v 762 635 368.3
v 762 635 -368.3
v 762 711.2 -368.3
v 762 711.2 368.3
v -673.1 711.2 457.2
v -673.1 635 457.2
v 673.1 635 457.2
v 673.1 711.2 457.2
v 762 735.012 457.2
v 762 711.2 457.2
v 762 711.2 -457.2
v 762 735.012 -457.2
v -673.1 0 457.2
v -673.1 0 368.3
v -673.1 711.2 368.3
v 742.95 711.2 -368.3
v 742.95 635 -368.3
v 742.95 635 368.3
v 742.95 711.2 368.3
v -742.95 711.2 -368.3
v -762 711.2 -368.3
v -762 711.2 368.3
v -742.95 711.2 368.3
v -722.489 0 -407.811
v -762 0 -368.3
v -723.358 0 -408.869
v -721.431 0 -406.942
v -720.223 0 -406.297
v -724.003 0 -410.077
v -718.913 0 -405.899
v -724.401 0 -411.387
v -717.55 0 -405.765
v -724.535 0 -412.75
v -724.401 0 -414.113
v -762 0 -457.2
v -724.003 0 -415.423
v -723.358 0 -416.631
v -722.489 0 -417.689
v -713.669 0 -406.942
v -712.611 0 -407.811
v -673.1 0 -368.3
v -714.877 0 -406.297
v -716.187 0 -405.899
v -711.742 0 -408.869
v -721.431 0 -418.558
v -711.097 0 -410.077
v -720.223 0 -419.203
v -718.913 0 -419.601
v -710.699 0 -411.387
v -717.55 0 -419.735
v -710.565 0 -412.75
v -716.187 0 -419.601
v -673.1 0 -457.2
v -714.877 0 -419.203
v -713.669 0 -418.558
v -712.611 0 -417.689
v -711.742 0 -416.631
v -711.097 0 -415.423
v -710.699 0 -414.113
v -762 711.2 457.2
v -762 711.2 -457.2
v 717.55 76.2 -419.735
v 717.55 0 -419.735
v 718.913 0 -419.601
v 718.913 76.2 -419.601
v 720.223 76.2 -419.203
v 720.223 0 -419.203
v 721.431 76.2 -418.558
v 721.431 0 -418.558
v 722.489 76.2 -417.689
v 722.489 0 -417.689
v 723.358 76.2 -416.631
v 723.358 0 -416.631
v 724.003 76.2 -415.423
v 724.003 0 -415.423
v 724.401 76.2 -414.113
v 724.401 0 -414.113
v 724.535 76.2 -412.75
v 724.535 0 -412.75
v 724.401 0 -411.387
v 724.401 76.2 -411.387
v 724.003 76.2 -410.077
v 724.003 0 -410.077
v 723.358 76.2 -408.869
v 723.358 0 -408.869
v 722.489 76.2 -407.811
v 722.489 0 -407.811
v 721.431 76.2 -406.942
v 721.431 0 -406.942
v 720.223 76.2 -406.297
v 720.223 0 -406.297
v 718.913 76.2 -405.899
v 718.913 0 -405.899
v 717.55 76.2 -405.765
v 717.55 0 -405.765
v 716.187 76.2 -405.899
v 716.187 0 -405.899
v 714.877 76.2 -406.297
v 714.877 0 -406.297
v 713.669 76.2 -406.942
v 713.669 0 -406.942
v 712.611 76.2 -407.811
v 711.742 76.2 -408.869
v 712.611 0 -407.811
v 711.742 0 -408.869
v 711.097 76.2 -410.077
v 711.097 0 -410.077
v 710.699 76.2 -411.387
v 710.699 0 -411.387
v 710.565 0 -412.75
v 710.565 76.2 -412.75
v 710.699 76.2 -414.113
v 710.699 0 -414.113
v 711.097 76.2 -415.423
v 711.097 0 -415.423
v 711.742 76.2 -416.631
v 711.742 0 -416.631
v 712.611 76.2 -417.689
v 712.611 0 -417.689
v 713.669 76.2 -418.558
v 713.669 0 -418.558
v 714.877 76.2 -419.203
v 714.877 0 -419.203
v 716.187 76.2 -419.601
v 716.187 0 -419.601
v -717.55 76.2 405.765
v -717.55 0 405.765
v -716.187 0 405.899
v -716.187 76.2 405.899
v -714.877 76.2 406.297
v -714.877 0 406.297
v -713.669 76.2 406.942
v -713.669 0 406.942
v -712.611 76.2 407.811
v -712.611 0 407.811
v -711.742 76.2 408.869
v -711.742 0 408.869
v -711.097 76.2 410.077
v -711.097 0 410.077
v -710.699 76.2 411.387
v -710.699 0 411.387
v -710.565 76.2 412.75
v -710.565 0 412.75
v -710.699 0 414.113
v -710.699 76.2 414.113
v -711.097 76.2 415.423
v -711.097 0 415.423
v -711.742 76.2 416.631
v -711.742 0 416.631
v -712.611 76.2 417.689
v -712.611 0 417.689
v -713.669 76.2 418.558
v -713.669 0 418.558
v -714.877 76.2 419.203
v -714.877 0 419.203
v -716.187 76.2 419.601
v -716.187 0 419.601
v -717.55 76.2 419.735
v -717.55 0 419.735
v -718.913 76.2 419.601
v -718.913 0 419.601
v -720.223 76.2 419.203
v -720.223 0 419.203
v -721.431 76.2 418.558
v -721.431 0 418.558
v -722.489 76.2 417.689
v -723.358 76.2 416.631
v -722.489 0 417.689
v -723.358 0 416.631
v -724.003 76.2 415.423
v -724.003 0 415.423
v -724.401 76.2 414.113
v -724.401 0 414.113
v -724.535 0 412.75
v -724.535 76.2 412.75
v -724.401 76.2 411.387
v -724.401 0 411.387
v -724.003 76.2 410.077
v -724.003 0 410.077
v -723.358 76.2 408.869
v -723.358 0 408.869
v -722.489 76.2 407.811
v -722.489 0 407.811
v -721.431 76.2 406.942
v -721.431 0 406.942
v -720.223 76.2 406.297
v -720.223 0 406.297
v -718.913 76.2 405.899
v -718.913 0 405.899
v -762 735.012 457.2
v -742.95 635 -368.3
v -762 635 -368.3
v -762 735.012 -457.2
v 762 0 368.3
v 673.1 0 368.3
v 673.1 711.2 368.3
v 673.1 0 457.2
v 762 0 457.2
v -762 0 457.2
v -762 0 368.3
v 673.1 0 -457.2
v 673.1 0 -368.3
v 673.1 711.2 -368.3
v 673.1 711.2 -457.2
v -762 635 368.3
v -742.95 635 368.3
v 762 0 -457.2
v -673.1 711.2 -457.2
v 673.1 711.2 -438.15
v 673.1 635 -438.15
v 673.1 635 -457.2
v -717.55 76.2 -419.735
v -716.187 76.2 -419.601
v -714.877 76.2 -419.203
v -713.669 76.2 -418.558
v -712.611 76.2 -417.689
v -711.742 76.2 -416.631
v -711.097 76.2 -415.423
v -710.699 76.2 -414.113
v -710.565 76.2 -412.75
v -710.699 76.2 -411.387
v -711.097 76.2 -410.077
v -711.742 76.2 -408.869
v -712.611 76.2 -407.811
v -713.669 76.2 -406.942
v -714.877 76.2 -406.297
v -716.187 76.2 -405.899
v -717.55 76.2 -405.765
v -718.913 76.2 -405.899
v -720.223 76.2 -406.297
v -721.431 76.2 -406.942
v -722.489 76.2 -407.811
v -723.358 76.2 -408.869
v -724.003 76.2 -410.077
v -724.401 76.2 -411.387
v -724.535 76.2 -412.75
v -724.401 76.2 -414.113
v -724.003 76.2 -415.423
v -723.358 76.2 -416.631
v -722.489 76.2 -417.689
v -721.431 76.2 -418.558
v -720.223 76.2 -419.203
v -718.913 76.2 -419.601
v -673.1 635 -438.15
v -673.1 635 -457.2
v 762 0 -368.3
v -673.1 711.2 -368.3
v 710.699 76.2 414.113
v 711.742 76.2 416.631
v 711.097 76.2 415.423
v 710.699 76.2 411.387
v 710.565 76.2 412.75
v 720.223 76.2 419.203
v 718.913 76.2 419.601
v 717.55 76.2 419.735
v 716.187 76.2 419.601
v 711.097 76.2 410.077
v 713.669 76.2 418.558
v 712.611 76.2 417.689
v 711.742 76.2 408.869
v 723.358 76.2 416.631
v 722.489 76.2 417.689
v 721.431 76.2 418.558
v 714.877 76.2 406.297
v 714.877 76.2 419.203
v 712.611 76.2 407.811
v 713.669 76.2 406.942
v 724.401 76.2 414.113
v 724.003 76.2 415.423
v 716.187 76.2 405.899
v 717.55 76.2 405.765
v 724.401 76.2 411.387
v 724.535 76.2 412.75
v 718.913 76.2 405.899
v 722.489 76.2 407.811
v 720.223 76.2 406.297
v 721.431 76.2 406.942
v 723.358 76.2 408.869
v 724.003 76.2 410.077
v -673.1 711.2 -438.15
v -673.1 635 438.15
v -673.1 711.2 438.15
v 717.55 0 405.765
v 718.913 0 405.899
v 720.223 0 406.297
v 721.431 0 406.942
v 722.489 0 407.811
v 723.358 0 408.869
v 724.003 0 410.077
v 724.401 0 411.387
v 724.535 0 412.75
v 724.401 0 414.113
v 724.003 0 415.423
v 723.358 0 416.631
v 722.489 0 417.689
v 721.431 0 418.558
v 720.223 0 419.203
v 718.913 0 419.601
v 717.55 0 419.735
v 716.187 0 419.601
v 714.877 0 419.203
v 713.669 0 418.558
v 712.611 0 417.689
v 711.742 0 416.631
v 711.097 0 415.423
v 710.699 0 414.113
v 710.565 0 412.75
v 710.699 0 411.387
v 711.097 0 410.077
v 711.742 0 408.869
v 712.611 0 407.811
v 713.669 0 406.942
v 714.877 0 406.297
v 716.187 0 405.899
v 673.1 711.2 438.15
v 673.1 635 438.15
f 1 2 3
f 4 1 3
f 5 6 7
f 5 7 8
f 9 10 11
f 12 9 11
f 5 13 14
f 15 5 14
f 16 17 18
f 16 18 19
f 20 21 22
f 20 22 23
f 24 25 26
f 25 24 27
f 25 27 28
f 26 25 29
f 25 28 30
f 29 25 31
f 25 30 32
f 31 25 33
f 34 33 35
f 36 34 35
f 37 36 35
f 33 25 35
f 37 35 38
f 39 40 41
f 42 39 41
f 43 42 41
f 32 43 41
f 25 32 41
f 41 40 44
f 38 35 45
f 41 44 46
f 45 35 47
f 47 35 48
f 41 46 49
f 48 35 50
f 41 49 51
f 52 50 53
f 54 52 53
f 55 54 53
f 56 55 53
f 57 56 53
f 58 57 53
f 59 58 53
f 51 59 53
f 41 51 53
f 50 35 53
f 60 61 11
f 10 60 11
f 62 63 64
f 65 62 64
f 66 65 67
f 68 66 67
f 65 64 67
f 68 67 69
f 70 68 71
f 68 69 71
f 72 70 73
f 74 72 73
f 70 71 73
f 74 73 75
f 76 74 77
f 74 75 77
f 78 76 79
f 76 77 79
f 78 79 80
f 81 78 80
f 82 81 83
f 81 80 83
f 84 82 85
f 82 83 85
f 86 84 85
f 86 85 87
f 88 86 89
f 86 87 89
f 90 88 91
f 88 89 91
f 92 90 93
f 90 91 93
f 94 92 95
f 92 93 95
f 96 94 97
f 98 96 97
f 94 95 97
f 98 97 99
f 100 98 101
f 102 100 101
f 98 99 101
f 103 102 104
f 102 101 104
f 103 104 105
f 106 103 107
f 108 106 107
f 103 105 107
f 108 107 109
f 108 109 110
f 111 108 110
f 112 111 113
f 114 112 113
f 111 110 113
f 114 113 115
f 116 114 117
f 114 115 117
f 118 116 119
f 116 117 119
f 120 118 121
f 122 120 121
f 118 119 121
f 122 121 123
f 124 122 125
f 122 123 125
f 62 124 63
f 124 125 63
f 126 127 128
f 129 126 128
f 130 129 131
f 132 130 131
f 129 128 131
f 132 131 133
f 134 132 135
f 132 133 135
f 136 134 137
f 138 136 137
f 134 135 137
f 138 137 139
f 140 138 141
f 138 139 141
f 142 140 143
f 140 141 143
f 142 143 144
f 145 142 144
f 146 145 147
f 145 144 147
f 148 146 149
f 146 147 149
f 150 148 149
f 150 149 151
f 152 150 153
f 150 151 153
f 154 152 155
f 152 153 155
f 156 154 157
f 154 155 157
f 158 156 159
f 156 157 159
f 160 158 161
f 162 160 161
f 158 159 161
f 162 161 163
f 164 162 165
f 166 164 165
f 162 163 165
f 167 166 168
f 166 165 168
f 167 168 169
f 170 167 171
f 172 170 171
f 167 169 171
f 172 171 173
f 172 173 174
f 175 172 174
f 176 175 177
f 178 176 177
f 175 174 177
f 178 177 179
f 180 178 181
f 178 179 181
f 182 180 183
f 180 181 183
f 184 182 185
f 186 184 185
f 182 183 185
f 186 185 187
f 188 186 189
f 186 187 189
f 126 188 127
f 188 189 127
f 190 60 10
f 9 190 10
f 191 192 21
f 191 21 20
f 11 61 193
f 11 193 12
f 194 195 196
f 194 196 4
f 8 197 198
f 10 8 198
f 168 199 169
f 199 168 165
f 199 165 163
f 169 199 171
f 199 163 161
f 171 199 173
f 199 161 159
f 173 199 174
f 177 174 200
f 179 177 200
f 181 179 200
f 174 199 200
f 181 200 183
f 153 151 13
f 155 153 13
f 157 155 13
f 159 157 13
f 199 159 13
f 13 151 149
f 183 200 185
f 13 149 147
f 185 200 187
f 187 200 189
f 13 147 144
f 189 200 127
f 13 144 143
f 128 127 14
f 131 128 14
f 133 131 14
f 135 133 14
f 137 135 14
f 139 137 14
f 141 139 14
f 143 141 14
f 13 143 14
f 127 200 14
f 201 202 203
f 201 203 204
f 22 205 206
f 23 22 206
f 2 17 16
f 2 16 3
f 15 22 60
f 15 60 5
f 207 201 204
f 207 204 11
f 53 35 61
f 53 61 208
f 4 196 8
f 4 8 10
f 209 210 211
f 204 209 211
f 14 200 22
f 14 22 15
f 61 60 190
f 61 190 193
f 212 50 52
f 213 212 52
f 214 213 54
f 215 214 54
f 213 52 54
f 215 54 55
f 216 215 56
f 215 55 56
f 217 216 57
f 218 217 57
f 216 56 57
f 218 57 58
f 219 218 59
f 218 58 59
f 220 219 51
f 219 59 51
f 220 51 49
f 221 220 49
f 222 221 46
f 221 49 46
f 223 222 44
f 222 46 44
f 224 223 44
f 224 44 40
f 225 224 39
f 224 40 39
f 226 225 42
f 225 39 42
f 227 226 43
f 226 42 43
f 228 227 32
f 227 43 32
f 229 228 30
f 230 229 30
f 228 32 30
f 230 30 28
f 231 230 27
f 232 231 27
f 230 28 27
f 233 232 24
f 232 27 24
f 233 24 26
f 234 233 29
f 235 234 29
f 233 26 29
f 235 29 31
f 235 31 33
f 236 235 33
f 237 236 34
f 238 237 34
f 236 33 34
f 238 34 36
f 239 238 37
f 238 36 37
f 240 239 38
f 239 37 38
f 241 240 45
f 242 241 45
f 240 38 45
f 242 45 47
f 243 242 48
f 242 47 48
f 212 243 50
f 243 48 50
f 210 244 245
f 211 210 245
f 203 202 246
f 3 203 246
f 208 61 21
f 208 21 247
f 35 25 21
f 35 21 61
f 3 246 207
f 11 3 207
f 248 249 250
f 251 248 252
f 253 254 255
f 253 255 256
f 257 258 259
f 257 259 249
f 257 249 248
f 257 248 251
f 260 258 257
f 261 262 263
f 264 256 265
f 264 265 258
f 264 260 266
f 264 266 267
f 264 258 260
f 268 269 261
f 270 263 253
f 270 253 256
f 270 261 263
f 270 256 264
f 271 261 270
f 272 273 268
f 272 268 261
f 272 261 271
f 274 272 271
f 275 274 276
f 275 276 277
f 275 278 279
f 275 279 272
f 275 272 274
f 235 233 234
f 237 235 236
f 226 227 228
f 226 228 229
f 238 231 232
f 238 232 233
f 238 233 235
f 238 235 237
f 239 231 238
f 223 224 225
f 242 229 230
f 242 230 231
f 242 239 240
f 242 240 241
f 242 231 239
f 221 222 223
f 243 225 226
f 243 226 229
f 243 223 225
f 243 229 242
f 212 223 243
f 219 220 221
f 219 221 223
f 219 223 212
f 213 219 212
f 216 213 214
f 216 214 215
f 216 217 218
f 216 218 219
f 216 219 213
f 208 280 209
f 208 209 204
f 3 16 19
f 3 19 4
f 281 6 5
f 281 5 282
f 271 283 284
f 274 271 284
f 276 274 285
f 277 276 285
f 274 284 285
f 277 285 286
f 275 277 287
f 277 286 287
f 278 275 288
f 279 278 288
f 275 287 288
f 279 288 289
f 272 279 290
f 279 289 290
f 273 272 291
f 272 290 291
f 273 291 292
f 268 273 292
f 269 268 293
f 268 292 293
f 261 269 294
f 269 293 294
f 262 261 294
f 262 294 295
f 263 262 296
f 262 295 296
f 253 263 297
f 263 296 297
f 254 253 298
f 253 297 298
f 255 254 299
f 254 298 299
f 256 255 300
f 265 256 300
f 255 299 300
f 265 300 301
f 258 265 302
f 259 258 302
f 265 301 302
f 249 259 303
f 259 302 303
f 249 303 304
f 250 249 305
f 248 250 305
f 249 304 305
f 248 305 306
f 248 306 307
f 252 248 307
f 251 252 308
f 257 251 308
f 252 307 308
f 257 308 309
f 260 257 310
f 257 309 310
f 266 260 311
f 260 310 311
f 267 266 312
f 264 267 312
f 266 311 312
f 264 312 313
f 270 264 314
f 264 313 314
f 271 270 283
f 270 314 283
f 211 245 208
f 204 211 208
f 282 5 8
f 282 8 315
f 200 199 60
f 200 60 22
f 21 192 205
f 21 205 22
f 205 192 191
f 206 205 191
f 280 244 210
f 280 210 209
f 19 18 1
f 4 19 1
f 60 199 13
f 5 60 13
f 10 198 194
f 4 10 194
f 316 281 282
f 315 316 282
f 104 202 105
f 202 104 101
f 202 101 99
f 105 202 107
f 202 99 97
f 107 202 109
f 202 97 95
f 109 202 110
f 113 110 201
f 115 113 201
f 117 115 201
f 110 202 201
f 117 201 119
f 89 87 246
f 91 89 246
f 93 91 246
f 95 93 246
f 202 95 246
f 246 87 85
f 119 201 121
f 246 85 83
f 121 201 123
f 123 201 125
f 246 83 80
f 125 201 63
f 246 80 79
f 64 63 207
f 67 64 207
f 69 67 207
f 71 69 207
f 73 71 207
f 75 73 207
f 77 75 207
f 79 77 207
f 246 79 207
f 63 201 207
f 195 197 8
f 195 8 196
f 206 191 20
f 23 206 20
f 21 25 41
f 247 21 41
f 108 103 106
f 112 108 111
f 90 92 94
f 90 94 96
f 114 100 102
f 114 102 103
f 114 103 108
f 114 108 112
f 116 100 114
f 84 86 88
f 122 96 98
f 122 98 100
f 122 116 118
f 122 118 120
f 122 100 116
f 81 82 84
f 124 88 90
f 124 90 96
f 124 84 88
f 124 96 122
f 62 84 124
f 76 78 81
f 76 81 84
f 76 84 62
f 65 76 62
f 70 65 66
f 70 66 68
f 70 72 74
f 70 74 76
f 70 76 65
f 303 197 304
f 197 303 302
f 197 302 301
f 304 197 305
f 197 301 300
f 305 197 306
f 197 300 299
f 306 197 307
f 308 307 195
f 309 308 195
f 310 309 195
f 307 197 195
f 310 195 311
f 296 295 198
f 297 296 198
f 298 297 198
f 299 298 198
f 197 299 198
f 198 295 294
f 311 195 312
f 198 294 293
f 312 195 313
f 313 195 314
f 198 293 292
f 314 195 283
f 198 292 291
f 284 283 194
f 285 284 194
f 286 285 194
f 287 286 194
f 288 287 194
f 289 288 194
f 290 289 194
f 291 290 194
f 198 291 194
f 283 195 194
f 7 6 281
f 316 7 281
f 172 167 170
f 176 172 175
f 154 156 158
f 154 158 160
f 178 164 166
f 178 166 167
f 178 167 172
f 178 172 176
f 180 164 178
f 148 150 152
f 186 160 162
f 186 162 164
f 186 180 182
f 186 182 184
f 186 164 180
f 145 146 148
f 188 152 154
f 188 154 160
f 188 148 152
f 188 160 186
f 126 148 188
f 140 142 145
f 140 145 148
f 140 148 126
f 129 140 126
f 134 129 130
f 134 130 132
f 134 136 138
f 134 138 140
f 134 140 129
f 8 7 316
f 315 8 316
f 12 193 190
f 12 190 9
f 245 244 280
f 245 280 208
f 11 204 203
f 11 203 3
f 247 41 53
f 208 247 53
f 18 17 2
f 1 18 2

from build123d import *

# Parameters (mm, degrees)
SKETCH1_W             = 88.9
SKETCH1_H             = 88.9
BOSS_EXTRUDE1_DEPTH   = 711.2
BOSS_EXTRUDE1_2_DEPTH = 711.2
BOSS_EXTRUDE1_3_DEPTH = 711.2
BOSS_EXTRUDE1_4_DEPTH = 711.2
SKETCH2_W             = 1524
SKETCH2_H             = 914.4
BOSS_EXTRUDE2_DEPTH   = 23.8125
SKETCH3_W             = 19.05
SKETCH3_H             = 76.2
BOSS_EXTRUDE3_DEPTH   = 736.6
BOSS_EXTRUDE3_2_DEPTH = 736.6
SKETCH4_W             = 19.05
SKETCH4_H             = 76.2
BOSS_EXTRUDE4_DEPTH   = 1346.2
BOSS_EXTRUDE4_2_DEPTH = 1346.2
SKETCH6_R             = 6.985
CUT_EXTRUDE1_DEPTH    = 76.2


with BuildPart() as part:
    # Sketch1 → Boss-Extrude1 (new body)
    with BuildSketch(Plane(origin=(0, 0, 0), x_dir=(1, 0, 0), z_dir=(0, 1, 0))):
        with Locations((-717.55, 412.75)):
            Rectangle(SKETCH1_W, SKETCH1_H)
    extrude(amount=BOSS_EXTRUDE1_DEPTH)


with BuildPart() as body_2:
    # Sketch1 → Boss-Extrude1 2 (new body)
    with BuildSketch(Plane(origin=(0, 0, 0), x_dir=(1, 0, 0), z_dir=(0, 1, 0))):
        with Locations((717.55, 412.75)):
            Rectangle(SKETCH1_W, SKETCH1_H)
    extrude(amount=BOSS_EXTRUDE1_2_DEPTH)


with BuildPart() as body_3:
    # Sketch1 → Boss-Extrude1 3 (new body)
    with BuildSketch(Plane(origin=(0, 0, 0), x_dir=(1, 0, 0), z_dir=(0, 1, 0))):
        with Locations((717.55, -412.75)):
            Rectangle(SKETCH1_W, SKETCH1_H)
    extrude(amount=BOSS_EXTRUDE1_3_DEPTH)


with BuildPart() as body_4:
    # Sketch1 → Boss-Extrude1 4 (new body)
    with BuildSketch(Plane(origin=(0, 0, 0), x_dir=(1, 0, 0), z_dir=(0, 1, 0))):
        with Locations((-717.55, -412.75)):
            Rectangle(SKETCH1_W, SKETCH1_H)
    extrude(amount=BOSS_EXTRUDE1_4_DEPTH)


with BuildPart() as body_5:
    # Sketch2 → Boss-Extrude2 (new body)
    with BuildSketch(Plane(origin=(0, 711.2, 0), x_dir=(1, 0, 0), z_dir=(0, 1, 0))):
        Rectangle(SKETCH2_W, SKETCH2_H)
    extrude(amount=BOSS_EXTRUDE2_DEPTH)


with BuildPart() as body_6:
    # Sketch3 → Boss-Extrude3 (new body)
    with BuildSketch(Plane.XY.offset(-368.3)):
        with Locations((-752.475, 673.1)):
            Rectangle(SKETCH3_W, SKETCH3_H)
    extrude(amount=BOSS_EXTRUDE3_DEPTH)


with BuildPart() as body_7:
    # Sketch3 → Boss-Extrude3 2 (new body)
    with BuildSketch(Plane.XY.offset(-368.3)):
        with Locations((752.475, 673.1)):
            Rectangle(SKETCH3_W, SKETCH3_H)
    extrude(amount=BOSS_EXTRUDE3_2_DEPTH)


with BuildPart() as body_8:
    # Sketch4 → Boss-Extrude4 (new body)
    with BuildSketch(Plane(origin=(-673.1, 0, 0), x_dir=(0, 0, -1), z_dir=(1, 0, 0))):
        with Locations((-447.675, 673.1)):
            Rectangle(SKETCH4_W, SKETCH4_H)
    extrude(amount=BOSS_EXTRUDE4_DEPTH)


with BuildPart() as body_9:
    # Sketch4 → Boss-Extrude4 2 (new body)
    with BuildSketch(Plane(origin=(-673.1, 0, 0), x_dir=(0, 0, -1), z_dir=(1, 0, 0))):
        with Locations((447.675, 673.1)):
            Rectangle(SKETCH4_W, SKETCH4_H)
    extrude(amount=BOSS_EXTRUDE4_2_DEPTH)


with BuildPart() as cut_extrude1_tool:
    # Sketch6 → Cut-Extrude1 (new body)
    with BuildSketch(Plane.XZ):
        with Locations(Location((-717.55, 412.75, 0), (0, 0, 270))):
            Circle(SKETCH6_R)
        with Locations(Location((-717.55, -412.75, 0), (0, 0, 270))):
            Circle(SKETCH6_R)
        with Locations(Location((717.55, -412.75, 0), (0, 0, 270))):
            Circle(SKETCH6_R)
        with Locations(Location((717.55, 412.75, 0), (0, 0, 270))):
            Circle(SKETCH6_R)
    extrude(amount=-CUT_EXTRUDE1_DEPTH)


with BuildPart() as part_1:
    add(part.part)

    # Cut-Extrude1: cut by cut_extrude1_tool
    add(cut_extrude1_tool.part, mode=Mode.SUBTRACT)


with BuildPart() as body_2_1:
    add(body_2.part)

    # Cut-Extrude1: cut by cut_extrude1_tool
    add(cut_extrude1_tool.part, mode=Mode.SUBTRACT)


with BuildPart() as body_3_1:
    add(body_3.part)

    # Cut-Extrude1: cut by cut_extrude1_tool
    add(cut_extrude1_tool.part, mode=Mode.SUBTRACT)


with BuildPart() as body_4_1:
    add(body_4.part)

    # Cut-Extrude1: cut by cut_extrude1_tool
    add(cut_extrude1_tool.part, mode=Mode.SUBTRACT)


solid = Compound([body_5.part, body_6.part, body_7.part, body_8.part, body_9.part, part_1.part, body_2_1.part, body_3_1.part, body_4_1.part])
